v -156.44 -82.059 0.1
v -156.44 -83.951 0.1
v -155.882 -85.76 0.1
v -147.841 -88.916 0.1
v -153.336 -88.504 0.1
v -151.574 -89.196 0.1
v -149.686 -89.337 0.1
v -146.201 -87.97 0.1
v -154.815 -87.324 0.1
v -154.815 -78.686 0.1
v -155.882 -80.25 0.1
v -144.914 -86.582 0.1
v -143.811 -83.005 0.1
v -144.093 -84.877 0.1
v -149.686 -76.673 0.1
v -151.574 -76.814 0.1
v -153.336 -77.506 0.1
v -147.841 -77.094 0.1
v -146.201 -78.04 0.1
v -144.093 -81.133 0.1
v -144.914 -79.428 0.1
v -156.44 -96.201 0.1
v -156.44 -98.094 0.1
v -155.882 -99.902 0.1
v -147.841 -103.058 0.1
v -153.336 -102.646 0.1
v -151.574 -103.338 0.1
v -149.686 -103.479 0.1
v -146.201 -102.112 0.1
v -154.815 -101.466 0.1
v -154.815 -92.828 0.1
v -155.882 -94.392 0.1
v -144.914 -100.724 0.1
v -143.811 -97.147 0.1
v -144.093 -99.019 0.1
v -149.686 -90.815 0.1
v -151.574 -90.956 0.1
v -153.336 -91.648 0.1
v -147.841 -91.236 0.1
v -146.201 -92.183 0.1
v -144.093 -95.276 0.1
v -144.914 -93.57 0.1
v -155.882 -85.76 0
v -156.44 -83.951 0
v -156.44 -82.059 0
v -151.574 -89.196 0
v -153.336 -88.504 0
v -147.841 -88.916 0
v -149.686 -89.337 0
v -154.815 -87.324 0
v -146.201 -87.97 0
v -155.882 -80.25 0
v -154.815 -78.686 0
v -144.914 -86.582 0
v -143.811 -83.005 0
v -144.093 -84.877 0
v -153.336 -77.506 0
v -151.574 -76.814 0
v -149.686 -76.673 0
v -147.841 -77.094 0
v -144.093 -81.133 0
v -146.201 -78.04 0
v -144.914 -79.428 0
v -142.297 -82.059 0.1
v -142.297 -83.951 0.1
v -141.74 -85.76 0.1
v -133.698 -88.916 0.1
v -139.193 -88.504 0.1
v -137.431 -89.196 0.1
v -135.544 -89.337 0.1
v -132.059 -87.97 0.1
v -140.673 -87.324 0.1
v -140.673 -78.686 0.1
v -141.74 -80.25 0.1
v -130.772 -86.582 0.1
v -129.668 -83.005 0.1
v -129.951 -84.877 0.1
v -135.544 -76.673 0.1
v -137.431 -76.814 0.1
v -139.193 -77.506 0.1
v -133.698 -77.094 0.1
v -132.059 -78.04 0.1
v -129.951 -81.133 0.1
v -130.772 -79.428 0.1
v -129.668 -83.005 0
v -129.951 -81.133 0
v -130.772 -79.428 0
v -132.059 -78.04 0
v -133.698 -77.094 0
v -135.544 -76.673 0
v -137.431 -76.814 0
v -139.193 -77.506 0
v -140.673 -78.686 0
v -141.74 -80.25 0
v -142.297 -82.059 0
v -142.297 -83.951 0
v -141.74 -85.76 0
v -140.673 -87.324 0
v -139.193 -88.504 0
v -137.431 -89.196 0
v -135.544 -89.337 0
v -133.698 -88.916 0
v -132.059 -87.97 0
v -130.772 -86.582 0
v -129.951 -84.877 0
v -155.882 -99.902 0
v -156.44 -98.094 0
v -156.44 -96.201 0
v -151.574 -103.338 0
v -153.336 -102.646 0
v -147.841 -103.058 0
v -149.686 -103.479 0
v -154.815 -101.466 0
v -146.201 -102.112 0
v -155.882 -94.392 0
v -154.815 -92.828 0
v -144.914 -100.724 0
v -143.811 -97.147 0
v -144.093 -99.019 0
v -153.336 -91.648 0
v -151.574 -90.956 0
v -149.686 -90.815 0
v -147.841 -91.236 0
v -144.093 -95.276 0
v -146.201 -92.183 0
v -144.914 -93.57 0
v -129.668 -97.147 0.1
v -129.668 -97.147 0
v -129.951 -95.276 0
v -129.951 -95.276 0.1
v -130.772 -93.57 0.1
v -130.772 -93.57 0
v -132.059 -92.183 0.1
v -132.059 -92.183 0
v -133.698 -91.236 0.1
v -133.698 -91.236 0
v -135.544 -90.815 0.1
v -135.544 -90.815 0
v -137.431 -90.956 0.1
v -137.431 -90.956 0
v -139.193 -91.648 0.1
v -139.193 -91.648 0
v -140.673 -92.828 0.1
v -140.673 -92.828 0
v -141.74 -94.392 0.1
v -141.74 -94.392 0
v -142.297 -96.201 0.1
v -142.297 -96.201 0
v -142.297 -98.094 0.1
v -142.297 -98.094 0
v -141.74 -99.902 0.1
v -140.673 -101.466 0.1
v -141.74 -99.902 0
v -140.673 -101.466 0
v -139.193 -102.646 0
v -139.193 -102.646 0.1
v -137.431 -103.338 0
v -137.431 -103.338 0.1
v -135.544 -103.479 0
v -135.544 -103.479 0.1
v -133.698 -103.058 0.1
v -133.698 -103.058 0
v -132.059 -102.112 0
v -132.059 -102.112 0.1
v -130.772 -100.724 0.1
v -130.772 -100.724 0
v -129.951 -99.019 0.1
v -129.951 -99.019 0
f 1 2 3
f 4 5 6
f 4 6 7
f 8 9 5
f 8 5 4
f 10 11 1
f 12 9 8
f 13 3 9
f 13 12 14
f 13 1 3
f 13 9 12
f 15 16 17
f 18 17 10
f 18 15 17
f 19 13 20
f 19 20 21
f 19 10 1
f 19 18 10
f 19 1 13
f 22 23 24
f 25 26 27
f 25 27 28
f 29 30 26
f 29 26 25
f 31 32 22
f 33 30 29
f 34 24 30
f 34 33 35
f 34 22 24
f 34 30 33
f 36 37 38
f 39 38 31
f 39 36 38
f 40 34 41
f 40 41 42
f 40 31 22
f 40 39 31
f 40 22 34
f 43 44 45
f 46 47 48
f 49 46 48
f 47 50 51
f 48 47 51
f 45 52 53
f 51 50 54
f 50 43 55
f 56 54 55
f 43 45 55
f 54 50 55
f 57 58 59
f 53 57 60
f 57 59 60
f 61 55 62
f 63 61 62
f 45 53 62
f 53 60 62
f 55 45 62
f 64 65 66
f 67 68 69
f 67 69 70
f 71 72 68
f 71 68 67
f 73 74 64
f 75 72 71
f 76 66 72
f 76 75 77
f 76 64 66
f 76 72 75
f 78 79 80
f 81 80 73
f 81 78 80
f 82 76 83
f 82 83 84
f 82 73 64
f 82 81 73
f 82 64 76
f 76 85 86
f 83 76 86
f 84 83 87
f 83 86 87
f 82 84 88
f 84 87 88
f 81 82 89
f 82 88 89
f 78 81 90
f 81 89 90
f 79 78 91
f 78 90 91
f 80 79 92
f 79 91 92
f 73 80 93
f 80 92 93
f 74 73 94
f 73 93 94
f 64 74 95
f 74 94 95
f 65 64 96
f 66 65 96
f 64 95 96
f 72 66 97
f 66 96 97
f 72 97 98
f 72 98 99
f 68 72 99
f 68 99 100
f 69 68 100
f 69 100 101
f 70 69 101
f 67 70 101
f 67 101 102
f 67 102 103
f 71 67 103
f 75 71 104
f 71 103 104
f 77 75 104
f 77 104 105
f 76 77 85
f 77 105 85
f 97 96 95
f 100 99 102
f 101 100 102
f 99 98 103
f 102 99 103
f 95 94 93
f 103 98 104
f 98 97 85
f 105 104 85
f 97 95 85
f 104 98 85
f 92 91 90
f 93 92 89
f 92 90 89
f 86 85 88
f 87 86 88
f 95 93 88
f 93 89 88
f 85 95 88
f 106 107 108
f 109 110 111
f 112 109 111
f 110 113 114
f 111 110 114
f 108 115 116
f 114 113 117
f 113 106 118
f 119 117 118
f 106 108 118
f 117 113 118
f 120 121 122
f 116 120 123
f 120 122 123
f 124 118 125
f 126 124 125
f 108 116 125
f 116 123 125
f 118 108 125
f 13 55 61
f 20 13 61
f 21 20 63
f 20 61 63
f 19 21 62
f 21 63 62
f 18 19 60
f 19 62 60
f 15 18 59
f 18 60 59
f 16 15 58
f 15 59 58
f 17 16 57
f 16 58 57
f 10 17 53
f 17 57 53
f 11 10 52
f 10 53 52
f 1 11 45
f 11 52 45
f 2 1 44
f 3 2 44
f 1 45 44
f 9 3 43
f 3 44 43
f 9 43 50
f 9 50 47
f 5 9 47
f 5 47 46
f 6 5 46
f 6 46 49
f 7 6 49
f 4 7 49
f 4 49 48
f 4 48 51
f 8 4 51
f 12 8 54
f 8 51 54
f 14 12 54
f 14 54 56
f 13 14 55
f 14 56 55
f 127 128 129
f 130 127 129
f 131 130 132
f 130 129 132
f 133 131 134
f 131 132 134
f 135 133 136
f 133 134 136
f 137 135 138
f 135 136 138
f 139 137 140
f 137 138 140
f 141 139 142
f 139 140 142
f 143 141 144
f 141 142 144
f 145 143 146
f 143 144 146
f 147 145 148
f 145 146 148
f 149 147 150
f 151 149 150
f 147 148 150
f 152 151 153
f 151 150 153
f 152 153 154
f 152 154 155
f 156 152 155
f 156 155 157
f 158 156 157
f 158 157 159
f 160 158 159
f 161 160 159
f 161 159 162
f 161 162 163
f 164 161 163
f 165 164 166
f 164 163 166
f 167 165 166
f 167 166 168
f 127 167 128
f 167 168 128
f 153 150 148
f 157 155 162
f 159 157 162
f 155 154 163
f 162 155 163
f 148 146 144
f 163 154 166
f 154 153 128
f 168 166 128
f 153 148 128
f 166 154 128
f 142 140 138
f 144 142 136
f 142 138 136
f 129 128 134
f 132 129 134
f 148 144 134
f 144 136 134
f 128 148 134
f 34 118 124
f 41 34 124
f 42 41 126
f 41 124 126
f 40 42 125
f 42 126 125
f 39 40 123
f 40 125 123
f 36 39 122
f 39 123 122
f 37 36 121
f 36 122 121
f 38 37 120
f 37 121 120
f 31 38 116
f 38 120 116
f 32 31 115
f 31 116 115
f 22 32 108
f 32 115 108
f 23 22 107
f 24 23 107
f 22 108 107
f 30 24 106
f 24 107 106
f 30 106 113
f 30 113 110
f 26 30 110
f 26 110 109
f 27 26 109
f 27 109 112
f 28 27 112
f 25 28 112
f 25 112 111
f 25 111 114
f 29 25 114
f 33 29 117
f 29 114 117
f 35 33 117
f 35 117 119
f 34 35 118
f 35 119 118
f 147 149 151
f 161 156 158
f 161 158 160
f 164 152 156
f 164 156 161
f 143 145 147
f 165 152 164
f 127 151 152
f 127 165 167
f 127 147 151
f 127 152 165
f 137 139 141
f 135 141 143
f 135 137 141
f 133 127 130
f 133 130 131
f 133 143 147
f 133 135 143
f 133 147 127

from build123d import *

# Parameters (mm, degrees)
SKETCH1_R             = 6.35
BOSS_EXTRUDE2_DEPTH   = 0.1
BOSS_EXTRUDE2_2_DEPTH = 0.1
BOSS_EXTRUDE2_3_DEPTH = 0.1
BOSS_EXTRUDE2_4_DEPTH = 0.1


with BuildPart() as part:
    # Sketch1 → Boss-Extrude2 (new body)
    with BuildSketch(Plane.XY):
        with Locations((-136.018406204, -83.005064822)):
            Circle(SKETCH1_R)
    extrude(amount=BOSS_EXTRUDE2_DEPTH)


with BuildPart() as body_2:
    # Sketch1 → Boss-Extrude2 2 (new body)
    with BuildSketch(Plane.XY):
        with Locations((-136.018406204, -97.147200445)):
            Circle(SKETCH1_R)
    extrude(amount=BOSS_EXTRUDE2_2_DEPTH)


with BuildPart() as body_3:
    # Sketch1 → Boss-Extrude2 3 (new body)
    with BuildSketch(Plane.XY):
        with Locations((-150.160541828, -97.147200445)):
            Circle(SKETCH1_R)
    extrude(amount=BOSS_EXTRUDE2_3_DEPTH)


with BuildPart() as body_4:
    # Sketch1 → Boss-Extrude2 4 (new body)
    with BuildSketch(Plane.XY):
        with Locations((-150.160541828, -83.005064822)):
            Circle(SKETCH1_R)
    extrude(amount=BOSS_EXTRUDE2_4_DEPTH)


solid = Compound([part.part, body_2.part, body_3.part, body_4.part])
